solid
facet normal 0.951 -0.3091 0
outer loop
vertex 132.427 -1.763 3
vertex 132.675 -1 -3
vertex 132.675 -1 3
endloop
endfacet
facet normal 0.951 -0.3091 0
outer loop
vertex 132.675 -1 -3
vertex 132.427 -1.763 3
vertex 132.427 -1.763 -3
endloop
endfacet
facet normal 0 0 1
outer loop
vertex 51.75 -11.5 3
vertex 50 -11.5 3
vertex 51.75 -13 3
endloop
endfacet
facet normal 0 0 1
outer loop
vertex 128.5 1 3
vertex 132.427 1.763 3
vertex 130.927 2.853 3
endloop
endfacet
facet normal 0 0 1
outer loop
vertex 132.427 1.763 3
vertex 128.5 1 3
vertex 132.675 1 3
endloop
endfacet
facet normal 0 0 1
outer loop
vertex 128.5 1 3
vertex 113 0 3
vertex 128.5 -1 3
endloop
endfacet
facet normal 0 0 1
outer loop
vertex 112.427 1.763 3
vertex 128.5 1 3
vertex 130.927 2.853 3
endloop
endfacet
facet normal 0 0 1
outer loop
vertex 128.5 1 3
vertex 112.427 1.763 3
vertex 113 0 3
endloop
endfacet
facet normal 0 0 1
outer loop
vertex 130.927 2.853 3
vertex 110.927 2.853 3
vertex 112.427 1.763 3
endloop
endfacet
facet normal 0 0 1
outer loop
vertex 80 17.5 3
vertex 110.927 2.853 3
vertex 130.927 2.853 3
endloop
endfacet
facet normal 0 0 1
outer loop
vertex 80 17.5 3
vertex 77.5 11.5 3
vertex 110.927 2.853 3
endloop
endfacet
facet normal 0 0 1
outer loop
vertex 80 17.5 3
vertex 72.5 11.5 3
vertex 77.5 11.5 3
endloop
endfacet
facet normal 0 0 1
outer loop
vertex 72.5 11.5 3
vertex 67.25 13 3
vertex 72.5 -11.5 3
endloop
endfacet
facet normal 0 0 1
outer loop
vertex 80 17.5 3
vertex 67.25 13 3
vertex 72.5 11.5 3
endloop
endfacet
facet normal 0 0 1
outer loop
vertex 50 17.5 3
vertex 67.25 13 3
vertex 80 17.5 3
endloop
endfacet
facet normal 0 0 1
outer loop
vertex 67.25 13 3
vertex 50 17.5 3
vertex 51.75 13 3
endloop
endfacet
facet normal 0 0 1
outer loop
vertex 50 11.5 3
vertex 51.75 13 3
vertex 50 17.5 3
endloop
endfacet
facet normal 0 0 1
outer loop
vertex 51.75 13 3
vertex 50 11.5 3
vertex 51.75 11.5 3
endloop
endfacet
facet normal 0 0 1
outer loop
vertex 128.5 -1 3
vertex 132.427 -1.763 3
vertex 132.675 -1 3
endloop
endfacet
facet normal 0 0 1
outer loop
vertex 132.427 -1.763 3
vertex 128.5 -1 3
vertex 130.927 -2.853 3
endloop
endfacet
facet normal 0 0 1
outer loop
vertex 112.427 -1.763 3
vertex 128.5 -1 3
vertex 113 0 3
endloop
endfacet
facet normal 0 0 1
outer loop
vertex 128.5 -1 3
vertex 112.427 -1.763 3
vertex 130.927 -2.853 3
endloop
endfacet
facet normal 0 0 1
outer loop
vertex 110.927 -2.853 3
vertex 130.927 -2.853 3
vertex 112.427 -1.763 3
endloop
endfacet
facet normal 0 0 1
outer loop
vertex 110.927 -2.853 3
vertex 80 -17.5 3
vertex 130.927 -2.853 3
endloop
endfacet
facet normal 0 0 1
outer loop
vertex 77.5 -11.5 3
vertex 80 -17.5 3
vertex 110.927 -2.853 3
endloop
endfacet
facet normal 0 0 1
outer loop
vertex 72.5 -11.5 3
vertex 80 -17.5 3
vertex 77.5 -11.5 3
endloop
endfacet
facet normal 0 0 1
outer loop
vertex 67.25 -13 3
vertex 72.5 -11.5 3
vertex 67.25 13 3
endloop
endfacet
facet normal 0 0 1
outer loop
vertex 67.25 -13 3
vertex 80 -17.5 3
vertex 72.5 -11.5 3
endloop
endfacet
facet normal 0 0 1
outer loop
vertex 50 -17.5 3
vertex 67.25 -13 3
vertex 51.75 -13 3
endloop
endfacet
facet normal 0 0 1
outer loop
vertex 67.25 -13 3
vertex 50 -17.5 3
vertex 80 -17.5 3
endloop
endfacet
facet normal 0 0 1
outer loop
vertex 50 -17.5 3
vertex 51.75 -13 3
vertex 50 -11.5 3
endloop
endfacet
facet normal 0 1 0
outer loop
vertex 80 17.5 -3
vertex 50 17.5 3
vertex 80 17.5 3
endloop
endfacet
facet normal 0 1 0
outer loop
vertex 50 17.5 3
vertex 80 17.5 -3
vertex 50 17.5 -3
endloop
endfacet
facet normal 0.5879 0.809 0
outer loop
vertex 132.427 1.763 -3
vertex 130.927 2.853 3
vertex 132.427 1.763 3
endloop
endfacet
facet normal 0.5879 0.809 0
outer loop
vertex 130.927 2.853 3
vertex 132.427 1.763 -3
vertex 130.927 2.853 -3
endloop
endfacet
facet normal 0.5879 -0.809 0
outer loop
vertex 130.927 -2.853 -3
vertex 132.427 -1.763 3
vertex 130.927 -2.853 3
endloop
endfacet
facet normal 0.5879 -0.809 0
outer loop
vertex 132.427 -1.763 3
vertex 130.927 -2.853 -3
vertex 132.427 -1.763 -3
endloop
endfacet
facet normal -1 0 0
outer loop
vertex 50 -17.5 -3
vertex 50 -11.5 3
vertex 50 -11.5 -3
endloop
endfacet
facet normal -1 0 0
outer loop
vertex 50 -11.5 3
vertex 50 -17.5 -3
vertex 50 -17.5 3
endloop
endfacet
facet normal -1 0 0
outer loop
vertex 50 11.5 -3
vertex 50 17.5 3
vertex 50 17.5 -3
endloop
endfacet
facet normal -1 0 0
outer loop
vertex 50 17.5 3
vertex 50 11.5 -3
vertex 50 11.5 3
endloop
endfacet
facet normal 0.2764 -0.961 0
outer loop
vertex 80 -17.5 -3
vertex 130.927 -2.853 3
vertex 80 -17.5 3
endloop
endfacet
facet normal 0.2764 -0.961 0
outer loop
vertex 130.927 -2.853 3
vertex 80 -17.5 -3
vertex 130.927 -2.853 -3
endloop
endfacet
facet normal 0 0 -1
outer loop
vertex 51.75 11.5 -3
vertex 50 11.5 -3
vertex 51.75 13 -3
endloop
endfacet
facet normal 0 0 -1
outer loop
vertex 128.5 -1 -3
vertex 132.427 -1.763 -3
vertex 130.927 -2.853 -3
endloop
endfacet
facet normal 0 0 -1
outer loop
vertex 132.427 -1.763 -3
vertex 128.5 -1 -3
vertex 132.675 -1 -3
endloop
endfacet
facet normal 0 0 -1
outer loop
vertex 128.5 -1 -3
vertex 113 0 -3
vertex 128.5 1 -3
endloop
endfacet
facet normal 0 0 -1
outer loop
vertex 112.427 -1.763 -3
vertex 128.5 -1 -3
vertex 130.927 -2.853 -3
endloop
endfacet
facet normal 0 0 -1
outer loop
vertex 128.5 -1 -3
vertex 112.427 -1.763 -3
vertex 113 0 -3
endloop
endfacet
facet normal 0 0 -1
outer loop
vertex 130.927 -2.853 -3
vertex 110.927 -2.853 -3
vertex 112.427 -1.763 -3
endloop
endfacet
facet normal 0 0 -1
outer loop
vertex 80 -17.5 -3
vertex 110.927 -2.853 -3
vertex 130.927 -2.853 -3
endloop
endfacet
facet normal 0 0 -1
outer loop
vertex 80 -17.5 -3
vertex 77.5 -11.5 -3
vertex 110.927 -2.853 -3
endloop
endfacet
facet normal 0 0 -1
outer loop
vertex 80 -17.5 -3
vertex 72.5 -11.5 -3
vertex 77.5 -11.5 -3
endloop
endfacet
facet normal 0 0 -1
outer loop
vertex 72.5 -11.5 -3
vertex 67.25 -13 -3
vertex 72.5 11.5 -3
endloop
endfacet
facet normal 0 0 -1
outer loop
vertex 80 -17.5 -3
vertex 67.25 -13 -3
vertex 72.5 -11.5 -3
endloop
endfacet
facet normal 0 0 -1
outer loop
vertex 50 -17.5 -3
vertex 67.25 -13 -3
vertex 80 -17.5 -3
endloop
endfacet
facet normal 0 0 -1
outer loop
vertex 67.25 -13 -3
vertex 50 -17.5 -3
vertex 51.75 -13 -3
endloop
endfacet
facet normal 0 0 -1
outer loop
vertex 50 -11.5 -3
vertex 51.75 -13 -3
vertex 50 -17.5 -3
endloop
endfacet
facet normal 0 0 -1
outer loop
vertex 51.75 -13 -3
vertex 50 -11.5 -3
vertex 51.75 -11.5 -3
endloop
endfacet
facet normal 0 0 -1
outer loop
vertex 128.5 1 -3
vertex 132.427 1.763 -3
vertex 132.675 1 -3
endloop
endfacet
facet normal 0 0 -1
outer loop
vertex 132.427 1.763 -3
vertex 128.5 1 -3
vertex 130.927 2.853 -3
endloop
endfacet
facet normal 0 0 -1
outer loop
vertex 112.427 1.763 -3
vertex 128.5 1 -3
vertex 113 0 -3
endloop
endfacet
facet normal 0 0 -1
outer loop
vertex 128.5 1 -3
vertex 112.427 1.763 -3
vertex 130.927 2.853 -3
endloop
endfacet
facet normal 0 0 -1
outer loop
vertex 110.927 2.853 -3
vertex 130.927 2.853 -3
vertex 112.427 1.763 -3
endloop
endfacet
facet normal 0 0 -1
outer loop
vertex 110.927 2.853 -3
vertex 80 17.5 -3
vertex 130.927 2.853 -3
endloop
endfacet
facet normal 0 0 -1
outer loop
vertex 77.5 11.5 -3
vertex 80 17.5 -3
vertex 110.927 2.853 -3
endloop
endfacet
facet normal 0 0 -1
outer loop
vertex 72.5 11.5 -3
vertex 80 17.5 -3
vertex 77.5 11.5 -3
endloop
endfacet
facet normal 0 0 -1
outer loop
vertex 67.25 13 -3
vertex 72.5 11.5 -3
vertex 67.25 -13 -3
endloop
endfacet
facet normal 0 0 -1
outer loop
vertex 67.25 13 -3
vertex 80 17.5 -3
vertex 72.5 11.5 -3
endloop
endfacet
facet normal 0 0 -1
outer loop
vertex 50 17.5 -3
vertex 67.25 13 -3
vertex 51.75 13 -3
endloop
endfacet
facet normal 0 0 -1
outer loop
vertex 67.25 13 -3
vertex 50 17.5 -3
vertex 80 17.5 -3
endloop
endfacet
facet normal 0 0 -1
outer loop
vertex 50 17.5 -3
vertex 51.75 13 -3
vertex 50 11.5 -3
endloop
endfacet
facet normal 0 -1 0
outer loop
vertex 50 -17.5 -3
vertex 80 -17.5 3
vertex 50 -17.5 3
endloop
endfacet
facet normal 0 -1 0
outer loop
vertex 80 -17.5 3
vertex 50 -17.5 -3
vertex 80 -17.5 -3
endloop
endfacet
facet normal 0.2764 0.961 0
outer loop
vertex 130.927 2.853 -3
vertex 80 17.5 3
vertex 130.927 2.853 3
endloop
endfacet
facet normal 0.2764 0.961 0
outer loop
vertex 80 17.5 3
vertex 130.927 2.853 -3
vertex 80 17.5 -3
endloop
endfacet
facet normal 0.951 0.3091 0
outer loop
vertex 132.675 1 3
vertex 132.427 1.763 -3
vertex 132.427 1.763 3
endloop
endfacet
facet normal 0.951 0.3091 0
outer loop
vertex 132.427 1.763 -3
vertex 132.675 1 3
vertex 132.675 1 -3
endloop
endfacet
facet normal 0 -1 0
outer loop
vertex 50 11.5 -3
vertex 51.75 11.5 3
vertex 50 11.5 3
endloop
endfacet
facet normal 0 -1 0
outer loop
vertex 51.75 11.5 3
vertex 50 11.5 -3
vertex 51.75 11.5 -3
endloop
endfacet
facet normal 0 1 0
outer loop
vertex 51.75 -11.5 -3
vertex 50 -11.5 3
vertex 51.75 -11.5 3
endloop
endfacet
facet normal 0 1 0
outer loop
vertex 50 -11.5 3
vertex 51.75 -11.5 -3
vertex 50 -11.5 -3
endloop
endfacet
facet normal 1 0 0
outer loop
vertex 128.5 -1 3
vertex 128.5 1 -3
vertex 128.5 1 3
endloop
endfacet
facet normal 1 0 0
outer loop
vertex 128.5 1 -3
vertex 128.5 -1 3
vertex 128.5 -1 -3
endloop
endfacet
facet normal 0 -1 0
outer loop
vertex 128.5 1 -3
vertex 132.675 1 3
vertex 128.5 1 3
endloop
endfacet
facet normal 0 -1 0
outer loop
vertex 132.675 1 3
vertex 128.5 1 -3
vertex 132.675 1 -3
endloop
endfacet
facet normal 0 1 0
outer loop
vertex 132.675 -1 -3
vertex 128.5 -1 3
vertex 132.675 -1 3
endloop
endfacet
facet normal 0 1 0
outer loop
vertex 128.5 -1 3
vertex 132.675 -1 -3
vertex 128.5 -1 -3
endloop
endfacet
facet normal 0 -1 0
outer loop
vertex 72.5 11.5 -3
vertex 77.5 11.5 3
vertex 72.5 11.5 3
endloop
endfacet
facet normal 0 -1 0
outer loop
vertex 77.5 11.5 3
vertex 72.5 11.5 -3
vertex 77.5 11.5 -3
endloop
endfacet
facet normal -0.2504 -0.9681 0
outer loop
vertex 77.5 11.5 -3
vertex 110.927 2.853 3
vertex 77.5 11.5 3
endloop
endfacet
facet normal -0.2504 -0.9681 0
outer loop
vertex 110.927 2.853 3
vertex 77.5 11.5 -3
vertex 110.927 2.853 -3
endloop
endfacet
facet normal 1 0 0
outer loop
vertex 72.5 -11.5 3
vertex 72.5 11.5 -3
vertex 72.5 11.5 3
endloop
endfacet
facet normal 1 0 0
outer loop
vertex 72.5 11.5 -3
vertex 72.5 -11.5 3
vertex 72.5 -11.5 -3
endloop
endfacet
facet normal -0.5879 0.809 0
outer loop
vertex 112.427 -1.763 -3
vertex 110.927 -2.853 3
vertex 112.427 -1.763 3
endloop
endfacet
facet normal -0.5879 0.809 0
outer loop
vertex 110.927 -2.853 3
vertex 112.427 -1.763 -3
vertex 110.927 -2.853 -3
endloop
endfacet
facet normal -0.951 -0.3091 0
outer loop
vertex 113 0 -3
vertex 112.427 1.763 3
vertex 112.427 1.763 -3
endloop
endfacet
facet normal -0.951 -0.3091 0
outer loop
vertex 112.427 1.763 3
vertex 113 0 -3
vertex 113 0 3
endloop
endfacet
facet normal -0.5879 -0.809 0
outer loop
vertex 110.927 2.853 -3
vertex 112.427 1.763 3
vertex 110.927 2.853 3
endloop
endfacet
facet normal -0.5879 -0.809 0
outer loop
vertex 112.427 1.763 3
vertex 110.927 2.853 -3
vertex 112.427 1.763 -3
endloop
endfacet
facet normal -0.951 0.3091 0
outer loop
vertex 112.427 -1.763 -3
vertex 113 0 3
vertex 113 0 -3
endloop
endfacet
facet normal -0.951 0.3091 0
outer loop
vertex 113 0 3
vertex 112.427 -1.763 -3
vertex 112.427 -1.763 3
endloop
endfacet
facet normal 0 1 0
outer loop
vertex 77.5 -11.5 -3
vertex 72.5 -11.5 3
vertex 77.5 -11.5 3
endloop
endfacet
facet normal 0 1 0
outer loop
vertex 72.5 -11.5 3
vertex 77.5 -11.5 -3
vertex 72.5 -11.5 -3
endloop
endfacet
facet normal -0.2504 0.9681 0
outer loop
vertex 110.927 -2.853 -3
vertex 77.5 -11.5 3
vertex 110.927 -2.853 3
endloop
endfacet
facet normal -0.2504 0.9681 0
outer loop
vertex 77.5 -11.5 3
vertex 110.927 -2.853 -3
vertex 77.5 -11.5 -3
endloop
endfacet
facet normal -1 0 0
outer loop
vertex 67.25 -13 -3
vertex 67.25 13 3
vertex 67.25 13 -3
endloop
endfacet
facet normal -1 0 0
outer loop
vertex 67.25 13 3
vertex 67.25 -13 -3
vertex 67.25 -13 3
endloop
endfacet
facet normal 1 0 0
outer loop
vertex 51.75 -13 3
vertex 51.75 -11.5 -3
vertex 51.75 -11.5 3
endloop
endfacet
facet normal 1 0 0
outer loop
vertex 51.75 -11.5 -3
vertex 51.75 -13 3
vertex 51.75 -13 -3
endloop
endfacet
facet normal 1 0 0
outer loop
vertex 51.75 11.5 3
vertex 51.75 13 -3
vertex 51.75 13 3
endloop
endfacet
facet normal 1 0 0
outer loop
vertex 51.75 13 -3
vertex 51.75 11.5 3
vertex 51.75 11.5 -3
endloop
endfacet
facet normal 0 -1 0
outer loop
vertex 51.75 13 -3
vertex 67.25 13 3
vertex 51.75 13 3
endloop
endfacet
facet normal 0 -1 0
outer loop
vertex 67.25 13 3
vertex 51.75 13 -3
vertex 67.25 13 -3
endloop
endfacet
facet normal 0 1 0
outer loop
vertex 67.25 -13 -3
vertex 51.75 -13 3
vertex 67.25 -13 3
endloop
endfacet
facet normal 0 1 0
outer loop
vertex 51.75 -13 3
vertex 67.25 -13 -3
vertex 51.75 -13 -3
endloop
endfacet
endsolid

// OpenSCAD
//15mm breit, 12cm auseinander
// 65mm weit von vorderkante weg, 30mm durchmesser

thickness=8;

module gelander(){
        translate([-59.5,0,0])
        cube([15.5,26,300], center=true);
        translate([59.5,0,0])
        cube([15.5,26,300], center=true);
    
}

module schirm(){
    translate([0,25/2+65,0])
    cylinder(r=18,h=300, $fn=32, center=true);
}

/*
difference(){
    union(){
        hull(){
            cube([130, 45, thickness], center=true);
            translate([0,25/2+65,0])
            cylinder(r=25,h=thickness,$fn=32,center=true);
        }
    }
    gelander();
    schirm();
    
    // aussparungen mitte
    hull(){
        cube([80,25,30],center=true);
        translate([0,45,0])
        cylinder(r=10,h=50,center=true);
    }
}
*/

module netz_spanner(){
    length = 60;
    height = 6;
    
    difference(){
        hull(){
            translate([65,0,0])
            cube([30, 35, height], center=true);
            
            // gelaender ends at 70
            translate([70+length,0,0])
            cylinder(r=3, h=height, center=true);
        }
        
        translate([50,0,0])
        cube([10, 26-3, height+1], center=true);
        
        translate([70+length+1,0,0])
        cube([5, 2, height+1], center=true);
        
        hull(){
            translate([75,0,0])
            cube([5, 26-3, height+1], center=true);
            
            translate([70+length-20,0,0])
            cylinder(r=3, h=height+1, center=true);
        }
    }
}

difference(){
    netz_spanner();
    gelander();
}
